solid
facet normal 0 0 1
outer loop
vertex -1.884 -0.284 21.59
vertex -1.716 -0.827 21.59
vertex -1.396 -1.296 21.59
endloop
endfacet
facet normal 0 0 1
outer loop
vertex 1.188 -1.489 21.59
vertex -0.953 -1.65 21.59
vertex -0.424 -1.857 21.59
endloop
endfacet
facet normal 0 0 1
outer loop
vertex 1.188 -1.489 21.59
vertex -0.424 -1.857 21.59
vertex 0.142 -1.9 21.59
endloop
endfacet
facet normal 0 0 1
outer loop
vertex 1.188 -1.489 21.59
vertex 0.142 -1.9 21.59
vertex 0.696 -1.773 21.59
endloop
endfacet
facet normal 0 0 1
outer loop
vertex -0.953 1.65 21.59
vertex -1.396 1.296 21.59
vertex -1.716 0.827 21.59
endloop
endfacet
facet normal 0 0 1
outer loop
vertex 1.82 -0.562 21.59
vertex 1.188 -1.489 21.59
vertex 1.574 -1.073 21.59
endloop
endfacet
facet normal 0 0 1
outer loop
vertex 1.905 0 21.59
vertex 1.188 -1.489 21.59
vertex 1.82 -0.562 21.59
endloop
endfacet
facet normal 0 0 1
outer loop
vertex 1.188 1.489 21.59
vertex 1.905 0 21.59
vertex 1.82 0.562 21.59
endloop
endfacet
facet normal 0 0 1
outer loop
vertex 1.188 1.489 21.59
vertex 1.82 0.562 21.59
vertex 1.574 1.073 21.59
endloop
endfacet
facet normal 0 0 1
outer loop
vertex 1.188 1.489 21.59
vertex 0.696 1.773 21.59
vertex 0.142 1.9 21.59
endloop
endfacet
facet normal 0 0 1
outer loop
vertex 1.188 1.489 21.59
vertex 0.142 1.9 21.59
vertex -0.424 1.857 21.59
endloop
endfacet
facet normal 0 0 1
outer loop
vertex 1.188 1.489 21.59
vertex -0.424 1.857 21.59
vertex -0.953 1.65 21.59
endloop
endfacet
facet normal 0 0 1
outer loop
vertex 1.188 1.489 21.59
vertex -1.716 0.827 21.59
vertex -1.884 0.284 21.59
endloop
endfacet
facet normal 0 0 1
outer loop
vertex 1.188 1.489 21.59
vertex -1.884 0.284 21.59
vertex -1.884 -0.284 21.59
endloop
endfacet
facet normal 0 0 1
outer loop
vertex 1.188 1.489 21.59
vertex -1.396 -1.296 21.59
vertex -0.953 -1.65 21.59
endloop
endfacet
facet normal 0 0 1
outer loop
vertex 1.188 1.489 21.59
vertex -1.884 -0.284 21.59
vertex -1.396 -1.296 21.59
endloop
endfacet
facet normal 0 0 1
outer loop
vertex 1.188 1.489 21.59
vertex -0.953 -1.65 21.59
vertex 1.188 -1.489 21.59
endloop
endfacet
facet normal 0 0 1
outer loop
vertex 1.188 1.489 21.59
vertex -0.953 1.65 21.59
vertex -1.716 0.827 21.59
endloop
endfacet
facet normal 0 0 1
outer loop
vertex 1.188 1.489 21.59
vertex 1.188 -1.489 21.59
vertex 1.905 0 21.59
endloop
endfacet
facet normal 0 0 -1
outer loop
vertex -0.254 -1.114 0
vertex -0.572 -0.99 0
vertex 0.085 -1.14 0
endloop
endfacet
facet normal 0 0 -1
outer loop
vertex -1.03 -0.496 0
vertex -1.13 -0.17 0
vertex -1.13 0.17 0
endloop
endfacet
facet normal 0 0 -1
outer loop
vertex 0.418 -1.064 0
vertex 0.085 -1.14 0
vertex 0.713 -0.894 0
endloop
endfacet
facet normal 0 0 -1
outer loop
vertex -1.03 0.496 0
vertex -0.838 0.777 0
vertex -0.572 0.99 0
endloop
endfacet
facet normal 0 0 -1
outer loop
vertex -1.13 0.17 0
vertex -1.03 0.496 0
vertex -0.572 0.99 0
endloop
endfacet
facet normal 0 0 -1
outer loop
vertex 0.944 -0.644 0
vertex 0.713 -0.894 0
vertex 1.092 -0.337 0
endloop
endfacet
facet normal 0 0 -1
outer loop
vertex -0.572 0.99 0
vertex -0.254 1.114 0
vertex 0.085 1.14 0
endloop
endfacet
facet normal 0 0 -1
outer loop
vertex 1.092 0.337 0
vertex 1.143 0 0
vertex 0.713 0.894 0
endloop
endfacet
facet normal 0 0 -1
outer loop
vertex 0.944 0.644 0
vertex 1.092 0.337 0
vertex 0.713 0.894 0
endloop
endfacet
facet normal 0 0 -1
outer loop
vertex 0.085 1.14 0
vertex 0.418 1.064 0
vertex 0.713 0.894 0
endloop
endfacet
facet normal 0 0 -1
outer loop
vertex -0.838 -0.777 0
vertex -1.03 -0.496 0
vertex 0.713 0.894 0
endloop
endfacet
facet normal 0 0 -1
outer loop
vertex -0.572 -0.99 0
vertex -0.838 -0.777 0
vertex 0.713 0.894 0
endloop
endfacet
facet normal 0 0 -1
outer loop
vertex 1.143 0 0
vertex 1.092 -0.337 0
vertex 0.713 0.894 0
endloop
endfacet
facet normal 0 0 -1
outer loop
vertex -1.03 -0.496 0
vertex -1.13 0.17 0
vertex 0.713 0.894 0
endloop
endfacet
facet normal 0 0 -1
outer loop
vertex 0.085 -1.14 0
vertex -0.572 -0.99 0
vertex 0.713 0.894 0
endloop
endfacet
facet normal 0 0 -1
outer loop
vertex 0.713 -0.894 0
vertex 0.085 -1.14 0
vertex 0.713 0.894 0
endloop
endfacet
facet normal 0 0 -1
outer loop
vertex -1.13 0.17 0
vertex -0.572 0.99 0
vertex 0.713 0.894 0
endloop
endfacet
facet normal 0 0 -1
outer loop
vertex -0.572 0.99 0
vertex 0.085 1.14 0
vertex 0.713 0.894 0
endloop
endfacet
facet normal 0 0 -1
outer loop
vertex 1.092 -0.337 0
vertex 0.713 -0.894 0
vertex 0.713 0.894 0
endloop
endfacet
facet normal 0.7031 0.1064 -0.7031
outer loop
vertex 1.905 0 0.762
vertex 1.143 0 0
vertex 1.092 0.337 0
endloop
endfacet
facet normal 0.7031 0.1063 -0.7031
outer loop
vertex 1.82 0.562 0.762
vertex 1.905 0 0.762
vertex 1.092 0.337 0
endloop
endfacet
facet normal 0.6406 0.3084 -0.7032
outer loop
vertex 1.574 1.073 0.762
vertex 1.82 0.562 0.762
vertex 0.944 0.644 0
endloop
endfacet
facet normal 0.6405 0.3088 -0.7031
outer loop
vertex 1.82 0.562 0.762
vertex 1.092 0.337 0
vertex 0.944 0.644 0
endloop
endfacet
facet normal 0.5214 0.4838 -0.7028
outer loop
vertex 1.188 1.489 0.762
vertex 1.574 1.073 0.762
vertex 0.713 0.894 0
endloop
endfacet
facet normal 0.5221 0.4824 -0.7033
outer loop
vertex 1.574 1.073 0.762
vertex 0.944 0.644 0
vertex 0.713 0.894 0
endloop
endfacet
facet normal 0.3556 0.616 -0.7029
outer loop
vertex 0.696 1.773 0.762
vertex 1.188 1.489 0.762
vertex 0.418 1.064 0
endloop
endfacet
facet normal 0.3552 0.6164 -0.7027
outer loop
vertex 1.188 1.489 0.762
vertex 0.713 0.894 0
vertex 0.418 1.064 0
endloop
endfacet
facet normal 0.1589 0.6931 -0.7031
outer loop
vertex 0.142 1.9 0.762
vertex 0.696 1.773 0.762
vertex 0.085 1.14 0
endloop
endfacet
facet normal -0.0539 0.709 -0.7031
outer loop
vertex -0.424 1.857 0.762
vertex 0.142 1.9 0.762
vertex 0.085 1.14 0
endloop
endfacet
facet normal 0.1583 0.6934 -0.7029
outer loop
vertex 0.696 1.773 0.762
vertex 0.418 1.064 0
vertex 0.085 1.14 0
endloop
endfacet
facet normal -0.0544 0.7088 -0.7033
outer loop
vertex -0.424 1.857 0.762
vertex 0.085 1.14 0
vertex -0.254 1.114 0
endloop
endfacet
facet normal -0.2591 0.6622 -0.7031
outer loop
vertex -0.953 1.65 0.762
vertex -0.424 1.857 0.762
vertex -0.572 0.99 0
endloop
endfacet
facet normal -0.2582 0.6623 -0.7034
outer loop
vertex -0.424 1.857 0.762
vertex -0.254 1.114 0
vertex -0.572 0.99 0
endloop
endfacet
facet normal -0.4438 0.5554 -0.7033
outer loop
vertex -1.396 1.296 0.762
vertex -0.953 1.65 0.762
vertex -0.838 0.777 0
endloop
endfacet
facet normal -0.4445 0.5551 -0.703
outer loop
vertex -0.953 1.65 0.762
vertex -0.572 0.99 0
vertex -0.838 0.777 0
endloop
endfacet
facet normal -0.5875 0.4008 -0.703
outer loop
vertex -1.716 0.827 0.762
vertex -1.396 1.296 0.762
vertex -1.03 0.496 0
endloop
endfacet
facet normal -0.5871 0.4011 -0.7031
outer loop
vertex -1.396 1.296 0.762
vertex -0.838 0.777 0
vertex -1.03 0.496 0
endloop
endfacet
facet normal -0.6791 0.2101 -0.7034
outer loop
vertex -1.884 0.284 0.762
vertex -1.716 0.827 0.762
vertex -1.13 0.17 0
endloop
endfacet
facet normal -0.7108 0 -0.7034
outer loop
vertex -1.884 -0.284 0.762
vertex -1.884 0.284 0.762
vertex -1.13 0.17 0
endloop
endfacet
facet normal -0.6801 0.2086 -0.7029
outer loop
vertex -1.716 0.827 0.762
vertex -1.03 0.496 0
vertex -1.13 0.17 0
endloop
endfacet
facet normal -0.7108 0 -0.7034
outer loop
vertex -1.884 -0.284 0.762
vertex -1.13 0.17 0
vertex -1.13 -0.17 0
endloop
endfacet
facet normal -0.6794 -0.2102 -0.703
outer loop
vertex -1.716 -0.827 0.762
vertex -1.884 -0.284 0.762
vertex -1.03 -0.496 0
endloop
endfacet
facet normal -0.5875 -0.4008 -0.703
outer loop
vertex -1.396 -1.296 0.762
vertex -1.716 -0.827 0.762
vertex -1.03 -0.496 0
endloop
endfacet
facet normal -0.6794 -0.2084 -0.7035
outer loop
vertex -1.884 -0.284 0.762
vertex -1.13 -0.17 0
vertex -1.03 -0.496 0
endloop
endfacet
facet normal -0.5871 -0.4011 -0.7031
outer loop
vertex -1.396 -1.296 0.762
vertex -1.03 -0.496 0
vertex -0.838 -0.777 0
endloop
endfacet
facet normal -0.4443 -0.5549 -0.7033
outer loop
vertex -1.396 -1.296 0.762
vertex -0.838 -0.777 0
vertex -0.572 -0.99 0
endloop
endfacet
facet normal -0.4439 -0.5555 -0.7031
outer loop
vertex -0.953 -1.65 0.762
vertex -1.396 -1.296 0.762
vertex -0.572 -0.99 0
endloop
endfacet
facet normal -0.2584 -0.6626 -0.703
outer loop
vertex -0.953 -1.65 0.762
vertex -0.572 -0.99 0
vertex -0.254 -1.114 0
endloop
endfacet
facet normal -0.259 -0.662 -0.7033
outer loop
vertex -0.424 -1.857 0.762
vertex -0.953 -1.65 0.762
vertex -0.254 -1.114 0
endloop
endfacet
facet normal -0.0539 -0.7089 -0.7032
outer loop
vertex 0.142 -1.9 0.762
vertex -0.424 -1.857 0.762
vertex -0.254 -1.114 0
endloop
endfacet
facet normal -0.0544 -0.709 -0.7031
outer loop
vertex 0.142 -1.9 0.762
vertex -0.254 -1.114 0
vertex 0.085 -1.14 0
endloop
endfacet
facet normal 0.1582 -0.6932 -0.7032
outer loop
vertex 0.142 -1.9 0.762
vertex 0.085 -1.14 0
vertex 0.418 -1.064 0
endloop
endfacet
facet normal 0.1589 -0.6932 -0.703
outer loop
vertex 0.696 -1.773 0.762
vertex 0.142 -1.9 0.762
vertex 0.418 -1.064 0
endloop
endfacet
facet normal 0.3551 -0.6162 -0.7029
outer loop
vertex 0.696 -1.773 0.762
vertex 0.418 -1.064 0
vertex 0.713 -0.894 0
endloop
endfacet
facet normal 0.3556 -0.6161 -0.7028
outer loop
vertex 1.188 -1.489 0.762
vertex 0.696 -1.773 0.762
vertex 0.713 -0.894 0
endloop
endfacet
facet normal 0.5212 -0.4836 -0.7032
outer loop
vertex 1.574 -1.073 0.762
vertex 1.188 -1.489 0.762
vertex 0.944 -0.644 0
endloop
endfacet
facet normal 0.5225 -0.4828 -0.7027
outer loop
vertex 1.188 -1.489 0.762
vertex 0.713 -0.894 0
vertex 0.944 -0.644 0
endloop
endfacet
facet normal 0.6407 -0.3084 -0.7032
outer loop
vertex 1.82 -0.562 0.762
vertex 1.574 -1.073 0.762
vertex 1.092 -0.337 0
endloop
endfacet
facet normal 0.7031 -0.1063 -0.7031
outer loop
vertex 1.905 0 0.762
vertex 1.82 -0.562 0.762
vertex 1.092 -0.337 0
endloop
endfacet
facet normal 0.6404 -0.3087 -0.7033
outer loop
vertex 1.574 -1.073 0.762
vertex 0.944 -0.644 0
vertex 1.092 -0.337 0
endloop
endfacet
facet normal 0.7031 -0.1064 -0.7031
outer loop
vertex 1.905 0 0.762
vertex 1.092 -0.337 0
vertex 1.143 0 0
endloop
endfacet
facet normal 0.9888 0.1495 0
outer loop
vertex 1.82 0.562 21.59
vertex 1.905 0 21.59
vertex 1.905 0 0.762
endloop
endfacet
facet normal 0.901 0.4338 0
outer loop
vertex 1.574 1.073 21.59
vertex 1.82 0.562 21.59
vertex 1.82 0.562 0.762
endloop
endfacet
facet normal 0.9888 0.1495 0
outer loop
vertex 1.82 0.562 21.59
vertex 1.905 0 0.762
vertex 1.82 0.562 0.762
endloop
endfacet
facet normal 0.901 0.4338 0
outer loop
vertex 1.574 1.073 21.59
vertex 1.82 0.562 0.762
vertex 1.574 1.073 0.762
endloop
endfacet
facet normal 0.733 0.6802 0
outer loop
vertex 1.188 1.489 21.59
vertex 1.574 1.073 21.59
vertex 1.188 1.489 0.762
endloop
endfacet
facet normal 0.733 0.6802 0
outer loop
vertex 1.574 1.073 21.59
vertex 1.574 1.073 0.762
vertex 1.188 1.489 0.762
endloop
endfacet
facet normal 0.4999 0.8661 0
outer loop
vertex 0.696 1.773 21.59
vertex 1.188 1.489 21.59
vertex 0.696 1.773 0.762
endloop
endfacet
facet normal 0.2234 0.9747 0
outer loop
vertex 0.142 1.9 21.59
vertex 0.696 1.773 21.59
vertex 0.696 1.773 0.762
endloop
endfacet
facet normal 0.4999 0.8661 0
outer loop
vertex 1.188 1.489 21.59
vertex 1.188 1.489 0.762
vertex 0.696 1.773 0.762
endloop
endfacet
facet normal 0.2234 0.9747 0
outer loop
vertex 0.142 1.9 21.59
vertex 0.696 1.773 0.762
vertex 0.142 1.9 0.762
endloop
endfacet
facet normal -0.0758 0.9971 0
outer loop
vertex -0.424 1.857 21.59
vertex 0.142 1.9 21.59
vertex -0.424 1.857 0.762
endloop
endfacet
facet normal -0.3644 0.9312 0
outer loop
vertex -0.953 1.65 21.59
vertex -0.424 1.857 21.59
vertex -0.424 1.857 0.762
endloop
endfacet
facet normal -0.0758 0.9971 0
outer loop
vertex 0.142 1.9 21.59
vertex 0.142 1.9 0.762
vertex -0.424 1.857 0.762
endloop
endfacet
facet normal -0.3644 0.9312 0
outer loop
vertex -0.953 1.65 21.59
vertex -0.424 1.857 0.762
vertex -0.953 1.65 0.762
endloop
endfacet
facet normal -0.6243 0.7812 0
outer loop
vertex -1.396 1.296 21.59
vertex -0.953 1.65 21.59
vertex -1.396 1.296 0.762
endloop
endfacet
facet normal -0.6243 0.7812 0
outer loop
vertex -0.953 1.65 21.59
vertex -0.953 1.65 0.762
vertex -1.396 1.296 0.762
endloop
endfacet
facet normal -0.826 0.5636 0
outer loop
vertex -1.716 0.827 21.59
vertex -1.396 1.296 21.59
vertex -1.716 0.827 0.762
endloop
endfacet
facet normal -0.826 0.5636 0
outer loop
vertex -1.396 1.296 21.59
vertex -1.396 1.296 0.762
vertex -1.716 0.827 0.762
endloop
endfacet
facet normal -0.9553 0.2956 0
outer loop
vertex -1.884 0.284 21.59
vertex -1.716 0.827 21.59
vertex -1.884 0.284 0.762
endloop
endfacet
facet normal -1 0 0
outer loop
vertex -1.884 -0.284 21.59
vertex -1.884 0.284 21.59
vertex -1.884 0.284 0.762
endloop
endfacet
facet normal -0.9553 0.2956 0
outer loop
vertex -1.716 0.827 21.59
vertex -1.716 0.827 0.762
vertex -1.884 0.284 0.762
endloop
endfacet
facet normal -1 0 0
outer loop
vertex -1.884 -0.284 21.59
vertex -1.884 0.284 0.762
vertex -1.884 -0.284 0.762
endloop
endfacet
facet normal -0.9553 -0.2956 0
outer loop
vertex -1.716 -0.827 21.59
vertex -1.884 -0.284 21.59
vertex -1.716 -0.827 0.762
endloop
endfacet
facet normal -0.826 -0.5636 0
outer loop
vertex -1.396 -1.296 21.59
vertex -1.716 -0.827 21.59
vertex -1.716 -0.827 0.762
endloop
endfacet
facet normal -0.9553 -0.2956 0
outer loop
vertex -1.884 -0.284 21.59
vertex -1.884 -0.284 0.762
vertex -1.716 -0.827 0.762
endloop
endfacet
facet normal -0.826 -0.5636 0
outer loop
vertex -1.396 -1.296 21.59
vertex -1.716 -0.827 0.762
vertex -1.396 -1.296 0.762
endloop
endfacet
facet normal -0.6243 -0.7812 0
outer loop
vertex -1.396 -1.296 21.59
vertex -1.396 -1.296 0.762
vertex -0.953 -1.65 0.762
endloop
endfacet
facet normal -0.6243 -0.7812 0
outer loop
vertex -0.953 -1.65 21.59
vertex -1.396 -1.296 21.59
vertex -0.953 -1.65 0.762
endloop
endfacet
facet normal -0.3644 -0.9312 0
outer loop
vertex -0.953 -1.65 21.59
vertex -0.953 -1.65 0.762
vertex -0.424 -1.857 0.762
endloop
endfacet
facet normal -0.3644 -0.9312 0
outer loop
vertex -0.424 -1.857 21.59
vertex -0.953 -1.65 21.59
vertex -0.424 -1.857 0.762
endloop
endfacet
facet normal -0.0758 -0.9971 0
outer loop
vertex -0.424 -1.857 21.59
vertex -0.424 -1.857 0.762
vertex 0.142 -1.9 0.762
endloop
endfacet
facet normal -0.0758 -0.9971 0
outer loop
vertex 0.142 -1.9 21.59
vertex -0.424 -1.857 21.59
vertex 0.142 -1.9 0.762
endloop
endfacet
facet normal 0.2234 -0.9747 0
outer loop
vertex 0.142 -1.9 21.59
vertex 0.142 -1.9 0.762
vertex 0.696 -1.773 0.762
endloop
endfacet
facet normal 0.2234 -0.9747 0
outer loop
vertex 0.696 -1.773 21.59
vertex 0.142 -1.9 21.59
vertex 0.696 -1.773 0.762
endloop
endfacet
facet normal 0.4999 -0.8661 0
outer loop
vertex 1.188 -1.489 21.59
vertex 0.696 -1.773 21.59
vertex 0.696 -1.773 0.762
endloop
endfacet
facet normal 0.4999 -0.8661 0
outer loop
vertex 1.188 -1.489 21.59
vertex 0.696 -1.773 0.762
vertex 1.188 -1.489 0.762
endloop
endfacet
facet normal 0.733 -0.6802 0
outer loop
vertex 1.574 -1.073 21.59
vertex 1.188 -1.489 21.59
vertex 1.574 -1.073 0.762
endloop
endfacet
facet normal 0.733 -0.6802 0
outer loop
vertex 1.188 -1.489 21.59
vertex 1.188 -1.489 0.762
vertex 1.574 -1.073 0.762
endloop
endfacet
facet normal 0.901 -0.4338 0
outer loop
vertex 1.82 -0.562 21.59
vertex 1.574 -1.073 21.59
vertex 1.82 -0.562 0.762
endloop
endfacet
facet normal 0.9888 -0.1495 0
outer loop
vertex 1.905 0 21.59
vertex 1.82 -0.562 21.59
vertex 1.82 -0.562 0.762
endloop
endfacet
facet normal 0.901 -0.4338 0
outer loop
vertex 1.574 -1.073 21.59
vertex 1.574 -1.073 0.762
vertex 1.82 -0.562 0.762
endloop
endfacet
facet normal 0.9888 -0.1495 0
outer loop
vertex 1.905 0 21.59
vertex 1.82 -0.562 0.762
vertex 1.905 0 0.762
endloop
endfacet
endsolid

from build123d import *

# Parameters (mm, degrees)
F0_R     = 1.905
F1_DEPTH = 25.4
F2_SIZE  = 0.762
F3_DEPTH = 7.62
F4_DEPTH = 3.81


with BuildPart() as f1:
    # F0 (on Top) → F1 (new body)
    with BuildSketch(Plane.XY):
        Circle(F0_R)
    extrude(amount=F1_DEPTH)

    # F2
    f2_edges = [f1.edges().sort_by_distance(p)[0] for p in [
        (-1.905, 0, 0),
    ]]
    chamfer(f2_edges, length=F2_SIZE)

    # F3 (cut): a face of the model
    f3_faces = [f1.faces().sort_by_distance(p)[0] for p in [
        (0, 0, 25.4),
    ]]
    extrude(f3_faces, amount=-F3_DEPTH, mode=Mode.SUBTRACT)

    # F4 (add): a face of the model
    f4_faces = [f1.faces().sort_by_distance(p)[0] for p in [
        (0, 0, 17.78),
    ]]
    extrude(f4_faces, amount=F4_DEPTH)


solid = f1.part
